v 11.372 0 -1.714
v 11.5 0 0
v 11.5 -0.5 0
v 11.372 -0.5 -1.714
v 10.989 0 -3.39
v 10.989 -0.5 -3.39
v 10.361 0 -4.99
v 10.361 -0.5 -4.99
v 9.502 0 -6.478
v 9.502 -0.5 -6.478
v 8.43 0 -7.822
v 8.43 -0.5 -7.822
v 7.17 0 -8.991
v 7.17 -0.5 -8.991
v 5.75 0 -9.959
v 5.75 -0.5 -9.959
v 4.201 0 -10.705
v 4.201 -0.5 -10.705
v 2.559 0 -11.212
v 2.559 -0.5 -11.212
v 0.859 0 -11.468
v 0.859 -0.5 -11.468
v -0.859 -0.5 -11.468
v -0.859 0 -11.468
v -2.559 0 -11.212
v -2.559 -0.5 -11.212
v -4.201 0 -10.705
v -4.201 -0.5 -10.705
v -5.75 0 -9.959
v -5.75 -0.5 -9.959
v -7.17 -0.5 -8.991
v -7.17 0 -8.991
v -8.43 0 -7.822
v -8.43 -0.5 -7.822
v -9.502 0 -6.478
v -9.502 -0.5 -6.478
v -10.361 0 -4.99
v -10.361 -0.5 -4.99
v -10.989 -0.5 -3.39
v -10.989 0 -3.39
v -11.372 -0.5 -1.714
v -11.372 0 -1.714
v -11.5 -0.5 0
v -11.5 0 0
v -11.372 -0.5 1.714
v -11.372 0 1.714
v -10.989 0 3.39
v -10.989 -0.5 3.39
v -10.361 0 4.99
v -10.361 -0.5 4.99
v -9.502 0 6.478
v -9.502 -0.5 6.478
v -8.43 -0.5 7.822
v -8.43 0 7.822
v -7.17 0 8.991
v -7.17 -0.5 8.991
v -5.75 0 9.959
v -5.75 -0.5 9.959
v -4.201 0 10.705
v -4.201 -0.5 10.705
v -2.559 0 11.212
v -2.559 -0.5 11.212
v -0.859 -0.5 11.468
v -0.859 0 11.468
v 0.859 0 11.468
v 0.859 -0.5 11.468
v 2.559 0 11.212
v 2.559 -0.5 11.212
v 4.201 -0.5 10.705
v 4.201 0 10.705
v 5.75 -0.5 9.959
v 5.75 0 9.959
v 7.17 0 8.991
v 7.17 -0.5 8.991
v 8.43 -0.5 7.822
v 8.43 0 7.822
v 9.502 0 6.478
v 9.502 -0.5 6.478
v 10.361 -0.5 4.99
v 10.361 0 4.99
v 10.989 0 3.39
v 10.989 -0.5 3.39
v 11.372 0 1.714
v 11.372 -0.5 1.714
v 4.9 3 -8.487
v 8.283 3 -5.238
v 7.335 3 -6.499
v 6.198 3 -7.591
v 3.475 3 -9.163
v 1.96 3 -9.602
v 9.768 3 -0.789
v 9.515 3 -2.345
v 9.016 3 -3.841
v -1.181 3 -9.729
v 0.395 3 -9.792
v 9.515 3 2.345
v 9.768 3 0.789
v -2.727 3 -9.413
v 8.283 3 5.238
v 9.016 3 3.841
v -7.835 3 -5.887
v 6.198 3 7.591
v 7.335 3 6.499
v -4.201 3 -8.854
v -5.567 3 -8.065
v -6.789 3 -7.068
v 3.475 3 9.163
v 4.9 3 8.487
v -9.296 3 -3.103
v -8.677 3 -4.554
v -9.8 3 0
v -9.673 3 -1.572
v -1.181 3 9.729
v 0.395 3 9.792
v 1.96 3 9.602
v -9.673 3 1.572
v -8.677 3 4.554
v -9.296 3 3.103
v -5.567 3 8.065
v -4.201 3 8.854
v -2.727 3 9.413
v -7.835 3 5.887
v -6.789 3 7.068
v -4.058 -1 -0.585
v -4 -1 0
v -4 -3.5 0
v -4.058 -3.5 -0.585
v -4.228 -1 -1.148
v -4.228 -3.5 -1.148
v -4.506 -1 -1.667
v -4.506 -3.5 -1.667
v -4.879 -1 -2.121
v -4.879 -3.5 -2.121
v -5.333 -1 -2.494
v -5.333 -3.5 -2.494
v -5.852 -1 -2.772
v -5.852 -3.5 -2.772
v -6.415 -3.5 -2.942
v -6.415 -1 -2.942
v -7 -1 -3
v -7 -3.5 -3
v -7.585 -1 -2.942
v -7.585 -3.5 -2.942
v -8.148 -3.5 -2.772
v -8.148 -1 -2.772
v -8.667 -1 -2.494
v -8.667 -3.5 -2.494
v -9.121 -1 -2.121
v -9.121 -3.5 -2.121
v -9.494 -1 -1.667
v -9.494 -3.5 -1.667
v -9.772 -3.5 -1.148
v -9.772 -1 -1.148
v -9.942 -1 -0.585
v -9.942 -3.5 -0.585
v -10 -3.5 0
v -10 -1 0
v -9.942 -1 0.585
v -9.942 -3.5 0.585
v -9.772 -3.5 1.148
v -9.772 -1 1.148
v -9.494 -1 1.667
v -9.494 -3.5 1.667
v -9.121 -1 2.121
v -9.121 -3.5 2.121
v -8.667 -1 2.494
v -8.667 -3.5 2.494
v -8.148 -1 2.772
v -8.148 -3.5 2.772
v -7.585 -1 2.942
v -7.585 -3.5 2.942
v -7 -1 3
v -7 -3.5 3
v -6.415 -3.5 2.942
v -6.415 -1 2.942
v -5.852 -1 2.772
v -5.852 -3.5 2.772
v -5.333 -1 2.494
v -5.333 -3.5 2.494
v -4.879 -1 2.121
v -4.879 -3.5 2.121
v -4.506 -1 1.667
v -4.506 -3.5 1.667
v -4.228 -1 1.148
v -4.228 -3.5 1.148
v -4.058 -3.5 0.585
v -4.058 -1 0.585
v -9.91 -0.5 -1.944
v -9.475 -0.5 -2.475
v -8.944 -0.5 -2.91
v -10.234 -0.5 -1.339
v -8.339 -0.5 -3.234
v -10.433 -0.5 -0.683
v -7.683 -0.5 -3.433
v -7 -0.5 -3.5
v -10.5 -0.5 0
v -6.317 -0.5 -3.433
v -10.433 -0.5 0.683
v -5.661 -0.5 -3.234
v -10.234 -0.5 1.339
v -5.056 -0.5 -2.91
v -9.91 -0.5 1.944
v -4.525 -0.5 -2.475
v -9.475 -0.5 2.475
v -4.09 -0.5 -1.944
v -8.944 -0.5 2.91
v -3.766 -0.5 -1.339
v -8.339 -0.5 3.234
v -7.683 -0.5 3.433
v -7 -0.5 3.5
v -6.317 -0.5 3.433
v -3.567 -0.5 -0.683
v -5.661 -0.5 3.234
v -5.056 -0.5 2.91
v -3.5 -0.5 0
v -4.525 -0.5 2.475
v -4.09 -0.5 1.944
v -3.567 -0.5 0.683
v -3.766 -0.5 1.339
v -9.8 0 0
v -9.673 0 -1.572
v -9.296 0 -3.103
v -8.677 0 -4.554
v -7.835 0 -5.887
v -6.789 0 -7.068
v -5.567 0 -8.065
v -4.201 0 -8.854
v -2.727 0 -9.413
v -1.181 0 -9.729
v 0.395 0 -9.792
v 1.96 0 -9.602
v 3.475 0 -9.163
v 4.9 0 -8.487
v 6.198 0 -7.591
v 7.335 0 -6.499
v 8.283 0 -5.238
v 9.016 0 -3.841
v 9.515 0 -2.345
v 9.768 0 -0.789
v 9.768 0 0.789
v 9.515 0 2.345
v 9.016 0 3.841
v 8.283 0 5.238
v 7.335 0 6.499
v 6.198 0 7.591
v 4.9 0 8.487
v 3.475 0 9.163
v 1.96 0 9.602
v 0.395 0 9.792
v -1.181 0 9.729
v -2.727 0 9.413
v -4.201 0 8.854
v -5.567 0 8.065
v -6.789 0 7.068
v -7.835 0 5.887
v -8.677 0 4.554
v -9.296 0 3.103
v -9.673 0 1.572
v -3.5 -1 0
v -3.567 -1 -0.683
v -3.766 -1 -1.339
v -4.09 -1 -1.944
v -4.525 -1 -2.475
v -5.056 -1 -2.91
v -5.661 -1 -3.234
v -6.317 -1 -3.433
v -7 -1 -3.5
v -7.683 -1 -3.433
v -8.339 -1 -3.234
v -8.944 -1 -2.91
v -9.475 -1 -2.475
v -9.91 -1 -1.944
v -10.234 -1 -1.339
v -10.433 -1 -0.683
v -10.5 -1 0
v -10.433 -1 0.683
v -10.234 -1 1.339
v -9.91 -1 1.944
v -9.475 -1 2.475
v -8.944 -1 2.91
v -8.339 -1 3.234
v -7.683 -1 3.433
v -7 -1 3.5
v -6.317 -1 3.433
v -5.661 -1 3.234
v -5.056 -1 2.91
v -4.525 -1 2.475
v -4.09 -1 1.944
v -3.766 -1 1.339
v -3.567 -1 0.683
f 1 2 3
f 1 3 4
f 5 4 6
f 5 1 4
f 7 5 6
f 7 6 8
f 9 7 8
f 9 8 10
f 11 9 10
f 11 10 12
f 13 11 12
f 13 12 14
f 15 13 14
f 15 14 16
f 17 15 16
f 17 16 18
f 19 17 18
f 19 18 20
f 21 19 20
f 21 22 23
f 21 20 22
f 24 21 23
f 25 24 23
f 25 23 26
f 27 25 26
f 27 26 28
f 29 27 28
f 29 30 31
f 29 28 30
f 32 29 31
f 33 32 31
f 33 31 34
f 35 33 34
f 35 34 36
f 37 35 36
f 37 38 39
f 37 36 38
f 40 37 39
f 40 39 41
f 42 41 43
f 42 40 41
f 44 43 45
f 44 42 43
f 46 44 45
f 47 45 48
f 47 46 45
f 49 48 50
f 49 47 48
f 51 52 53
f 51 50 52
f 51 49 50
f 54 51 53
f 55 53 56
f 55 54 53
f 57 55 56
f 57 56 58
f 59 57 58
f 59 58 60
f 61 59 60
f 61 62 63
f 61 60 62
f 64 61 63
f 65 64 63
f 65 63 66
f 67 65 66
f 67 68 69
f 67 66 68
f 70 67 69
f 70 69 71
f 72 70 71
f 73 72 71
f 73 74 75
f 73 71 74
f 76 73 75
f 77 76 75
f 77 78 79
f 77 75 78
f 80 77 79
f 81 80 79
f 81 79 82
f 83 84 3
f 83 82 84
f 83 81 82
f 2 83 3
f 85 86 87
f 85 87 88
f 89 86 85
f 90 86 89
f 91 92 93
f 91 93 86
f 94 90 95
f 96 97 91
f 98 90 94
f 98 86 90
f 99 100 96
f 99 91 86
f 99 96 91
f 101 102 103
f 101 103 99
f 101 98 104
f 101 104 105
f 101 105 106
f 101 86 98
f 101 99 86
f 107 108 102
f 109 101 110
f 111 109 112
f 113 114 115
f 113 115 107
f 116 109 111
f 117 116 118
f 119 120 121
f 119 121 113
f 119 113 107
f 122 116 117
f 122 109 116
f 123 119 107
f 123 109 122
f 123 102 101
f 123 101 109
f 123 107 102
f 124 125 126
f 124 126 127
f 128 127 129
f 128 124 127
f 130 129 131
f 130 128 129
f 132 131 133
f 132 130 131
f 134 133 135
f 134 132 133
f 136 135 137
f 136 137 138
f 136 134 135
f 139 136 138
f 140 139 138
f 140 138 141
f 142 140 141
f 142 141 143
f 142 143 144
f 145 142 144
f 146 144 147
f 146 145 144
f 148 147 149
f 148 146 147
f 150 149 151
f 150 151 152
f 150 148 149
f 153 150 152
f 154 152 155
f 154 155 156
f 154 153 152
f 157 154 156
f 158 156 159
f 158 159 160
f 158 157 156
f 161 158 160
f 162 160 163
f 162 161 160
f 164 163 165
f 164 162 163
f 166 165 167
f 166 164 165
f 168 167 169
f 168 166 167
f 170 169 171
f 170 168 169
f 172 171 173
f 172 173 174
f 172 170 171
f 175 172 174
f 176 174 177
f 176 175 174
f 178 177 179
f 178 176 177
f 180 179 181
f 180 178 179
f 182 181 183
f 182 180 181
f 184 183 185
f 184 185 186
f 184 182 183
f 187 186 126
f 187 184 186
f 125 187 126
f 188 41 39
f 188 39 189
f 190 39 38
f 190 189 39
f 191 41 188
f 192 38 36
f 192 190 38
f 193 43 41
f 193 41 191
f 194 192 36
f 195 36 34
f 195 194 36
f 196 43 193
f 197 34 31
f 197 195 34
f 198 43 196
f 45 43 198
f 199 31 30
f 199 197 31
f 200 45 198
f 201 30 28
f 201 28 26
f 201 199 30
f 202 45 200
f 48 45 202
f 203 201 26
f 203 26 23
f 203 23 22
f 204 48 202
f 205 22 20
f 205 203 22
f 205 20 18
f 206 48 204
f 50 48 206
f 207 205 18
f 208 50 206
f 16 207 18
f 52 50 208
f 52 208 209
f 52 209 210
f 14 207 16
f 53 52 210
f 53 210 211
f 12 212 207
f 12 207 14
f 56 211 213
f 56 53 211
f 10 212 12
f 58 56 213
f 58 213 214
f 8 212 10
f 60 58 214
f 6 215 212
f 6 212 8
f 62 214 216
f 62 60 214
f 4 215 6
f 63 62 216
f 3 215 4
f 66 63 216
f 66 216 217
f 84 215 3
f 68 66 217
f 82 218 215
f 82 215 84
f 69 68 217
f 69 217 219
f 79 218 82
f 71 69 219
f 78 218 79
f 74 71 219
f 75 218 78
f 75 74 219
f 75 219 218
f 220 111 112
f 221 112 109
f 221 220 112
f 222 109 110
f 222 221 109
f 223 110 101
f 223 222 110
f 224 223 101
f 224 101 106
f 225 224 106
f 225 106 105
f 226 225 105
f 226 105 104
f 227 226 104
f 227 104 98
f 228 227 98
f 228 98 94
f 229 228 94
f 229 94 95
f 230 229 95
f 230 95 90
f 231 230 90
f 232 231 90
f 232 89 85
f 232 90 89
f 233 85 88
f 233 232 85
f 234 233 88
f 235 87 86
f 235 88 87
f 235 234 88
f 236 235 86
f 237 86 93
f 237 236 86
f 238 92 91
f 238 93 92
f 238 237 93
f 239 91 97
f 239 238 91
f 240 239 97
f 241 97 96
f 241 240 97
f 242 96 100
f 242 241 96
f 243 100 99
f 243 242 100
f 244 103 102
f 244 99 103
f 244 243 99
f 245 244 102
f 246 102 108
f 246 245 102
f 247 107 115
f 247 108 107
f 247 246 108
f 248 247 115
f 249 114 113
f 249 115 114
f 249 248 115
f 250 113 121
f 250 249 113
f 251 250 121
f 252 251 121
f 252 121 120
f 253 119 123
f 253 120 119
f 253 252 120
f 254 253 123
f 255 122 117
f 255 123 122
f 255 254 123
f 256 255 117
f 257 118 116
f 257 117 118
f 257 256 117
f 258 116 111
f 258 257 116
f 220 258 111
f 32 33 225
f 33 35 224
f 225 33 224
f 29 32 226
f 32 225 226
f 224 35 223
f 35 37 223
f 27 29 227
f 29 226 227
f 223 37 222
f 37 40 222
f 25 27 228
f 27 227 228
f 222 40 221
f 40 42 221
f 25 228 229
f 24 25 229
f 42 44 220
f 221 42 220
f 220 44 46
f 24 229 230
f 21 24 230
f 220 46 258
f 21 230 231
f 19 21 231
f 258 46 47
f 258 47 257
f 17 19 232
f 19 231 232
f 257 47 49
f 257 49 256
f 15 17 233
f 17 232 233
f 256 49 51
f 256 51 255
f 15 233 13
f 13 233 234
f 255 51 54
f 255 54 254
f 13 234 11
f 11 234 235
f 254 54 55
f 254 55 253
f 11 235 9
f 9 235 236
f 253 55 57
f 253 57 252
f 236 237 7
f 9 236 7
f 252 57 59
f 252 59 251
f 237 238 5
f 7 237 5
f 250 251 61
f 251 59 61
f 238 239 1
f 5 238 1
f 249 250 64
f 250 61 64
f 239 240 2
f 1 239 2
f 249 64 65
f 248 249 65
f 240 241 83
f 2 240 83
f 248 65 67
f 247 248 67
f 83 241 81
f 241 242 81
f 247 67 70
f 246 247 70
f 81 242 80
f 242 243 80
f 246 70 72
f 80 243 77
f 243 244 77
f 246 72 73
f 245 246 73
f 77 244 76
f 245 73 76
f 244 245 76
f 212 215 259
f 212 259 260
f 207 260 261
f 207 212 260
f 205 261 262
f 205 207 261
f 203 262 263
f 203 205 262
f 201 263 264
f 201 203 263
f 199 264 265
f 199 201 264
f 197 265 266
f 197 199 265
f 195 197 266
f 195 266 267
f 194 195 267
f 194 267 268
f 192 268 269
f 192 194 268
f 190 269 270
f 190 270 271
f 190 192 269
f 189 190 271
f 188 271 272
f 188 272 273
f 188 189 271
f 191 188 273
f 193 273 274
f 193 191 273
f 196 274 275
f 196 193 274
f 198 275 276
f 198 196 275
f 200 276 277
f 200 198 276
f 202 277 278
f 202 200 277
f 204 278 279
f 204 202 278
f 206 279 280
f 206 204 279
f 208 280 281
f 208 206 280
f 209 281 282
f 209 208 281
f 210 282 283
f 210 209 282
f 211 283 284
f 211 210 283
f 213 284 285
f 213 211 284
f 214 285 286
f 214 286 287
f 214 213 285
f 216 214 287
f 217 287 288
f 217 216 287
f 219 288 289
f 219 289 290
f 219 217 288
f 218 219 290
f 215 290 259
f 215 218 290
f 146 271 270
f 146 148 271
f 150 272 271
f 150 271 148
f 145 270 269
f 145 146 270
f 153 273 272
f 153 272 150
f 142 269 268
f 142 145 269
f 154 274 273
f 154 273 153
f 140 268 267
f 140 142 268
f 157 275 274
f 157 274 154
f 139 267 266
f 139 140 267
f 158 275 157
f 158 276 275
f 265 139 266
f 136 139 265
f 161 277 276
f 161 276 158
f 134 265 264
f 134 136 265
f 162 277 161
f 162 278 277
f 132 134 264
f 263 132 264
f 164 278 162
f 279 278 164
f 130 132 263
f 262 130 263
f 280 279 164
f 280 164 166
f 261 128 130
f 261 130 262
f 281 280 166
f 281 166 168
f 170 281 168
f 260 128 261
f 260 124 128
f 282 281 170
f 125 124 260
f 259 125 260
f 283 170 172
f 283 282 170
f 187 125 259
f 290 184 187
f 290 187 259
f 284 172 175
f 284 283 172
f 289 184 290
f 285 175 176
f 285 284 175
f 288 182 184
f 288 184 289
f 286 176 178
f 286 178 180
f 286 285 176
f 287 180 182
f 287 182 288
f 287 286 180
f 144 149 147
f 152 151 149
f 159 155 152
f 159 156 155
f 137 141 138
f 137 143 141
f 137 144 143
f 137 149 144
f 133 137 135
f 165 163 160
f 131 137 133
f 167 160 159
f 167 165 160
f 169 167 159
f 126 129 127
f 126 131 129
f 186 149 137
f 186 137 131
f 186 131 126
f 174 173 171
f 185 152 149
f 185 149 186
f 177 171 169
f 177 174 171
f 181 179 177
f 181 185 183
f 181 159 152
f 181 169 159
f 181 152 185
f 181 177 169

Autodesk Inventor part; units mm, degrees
ref_plane "YZ Plane" through (0, 0, 0) normal (1, 0, 0) x (0, 1, 0)
ref_plane "XZ Plane" through (0, 0, 0) normal (0, 1, 0) x (-1, 0, 0)
ref_plane "XY Plane" through (0, 0, 0) normal (0, 0, 1) x (1, 0, 0)
sketch "スケッチ1" plane through (0, 0, 0) normal (0, 1, 0) x (-1, 0, 0)
  circle A0 centre (0, 0) radius 9.8
  dimension "d0" = 19.6
extrude "押し出し1" add sketch "スケッチ1" along normal blind 3
sketch "スケッチ2" plane through (0, 0, 0) normal (0, -1, 0) x (1, 0, 0)
  circle A0 centre (-7, 0) radius 3
  circle A1 centre (-7, 0) radius 3.5
  circle A2 centre (0, 0) radius 10
  dimension "d3" = 6
  dimension "d6" = 7
  dimension "d12" = 20
extrude "押し出し2" add sketch "スケッチ2" along normal blind 3.5 contours A0
extrude "押し出し3" add sketch "スケッチ2" along normal blind 1 contours A2 A1 | A2 A1 picked at (-3.7315, -0.526) picked at (-10.3053, -0.2541)
sketch "スケッチ3" plane through (0, 0, 0) normal (0, -1, 0) x (1, 0, 0)
  circle A0 centre (0, 0) radius 11.5
  dimension "d9" = 23
extrude "押し出し4" add sketch "スケッチ3" along normal blind 0.5
properties part number "wrist_hone_upper_cover"
